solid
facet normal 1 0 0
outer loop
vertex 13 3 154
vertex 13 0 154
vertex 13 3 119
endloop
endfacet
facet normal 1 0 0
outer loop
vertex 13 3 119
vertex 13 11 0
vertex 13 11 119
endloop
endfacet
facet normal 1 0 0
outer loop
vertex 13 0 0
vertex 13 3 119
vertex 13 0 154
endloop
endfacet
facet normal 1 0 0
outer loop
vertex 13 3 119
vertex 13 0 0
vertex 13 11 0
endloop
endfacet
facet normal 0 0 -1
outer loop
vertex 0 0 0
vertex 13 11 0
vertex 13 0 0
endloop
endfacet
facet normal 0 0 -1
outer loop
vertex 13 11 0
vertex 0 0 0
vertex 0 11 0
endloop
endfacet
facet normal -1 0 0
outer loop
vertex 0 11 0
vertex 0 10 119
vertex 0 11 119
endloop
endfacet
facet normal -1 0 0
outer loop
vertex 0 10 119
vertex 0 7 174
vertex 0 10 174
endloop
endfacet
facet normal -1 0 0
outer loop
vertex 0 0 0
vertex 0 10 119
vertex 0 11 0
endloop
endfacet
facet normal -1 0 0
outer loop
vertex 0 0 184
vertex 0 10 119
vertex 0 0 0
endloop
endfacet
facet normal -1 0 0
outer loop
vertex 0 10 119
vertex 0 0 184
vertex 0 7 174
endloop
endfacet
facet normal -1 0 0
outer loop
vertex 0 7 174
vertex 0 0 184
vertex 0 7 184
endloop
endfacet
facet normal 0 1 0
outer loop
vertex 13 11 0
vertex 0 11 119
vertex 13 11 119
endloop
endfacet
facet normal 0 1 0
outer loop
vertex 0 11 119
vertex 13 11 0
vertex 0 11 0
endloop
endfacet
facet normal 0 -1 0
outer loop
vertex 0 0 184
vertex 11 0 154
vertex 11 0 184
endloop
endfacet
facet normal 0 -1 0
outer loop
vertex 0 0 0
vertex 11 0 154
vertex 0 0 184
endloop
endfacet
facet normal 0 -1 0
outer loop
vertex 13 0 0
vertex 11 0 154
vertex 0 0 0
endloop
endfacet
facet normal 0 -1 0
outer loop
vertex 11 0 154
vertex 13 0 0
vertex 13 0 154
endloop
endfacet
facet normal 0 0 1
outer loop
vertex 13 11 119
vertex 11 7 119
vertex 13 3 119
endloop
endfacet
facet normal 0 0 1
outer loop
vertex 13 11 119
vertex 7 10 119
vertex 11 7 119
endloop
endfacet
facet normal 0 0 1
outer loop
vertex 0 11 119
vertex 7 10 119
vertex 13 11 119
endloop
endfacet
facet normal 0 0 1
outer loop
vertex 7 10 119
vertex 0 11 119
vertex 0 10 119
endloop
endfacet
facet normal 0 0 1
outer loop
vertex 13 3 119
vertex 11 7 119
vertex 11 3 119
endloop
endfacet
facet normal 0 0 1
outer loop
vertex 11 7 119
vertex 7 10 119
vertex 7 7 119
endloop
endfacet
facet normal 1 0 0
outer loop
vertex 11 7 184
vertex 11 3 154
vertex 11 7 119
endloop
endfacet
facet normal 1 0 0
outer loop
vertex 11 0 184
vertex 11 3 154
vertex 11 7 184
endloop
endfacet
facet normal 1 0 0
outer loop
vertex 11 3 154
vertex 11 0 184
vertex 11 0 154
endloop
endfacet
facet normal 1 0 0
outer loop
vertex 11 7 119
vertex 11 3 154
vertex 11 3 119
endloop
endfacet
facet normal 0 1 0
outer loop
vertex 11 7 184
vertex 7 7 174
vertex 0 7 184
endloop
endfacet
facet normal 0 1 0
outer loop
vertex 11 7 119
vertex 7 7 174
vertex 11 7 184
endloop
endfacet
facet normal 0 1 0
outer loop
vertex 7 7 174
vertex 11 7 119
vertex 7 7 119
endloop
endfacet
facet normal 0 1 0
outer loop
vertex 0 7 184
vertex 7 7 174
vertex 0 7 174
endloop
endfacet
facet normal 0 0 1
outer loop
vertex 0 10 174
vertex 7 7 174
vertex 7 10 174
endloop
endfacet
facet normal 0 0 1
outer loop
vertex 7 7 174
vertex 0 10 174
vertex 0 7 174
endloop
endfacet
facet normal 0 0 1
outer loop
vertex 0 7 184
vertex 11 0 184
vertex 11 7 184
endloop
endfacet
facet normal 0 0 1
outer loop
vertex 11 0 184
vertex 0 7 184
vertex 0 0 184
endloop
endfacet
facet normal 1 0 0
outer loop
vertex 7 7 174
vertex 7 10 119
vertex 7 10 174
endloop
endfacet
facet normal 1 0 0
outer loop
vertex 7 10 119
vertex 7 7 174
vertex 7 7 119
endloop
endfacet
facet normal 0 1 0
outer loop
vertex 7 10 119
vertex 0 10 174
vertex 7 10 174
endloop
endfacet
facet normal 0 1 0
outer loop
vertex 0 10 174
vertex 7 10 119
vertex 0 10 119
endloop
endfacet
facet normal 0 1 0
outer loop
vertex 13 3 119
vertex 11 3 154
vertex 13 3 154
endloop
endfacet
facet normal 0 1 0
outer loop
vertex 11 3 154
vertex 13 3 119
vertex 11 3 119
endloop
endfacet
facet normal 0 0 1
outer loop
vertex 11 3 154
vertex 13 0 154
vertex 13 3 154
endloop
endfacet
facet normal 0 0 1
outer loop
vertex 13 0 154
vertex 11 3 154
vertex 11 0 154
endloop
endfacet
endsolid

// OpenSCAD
translate([6.5, 5.5, 3.5]) color([0.969306850533619, 0.23531586477578126, 0.13212860983739783]) cube([13, 11, 7], center=true);
translate([6.5, 5.5, 10.5]) color([0.23368957459901674, 0.38460662479298113, 0.6084990843462054]) cube([13, 11, 7], center=true);
translate([6.5, 5.5, 17.5]) color([0.1325407149567407, 0.4984659545183915, 0.9178662904203972]) cube([13, 11, 7], center=true);
translate([6.5, 5.5, 24.5]) color([0.6160167741323543, 0.02601445858505036, 0.596125612844632]) cube([13, 11, 7], center=true);
translate([6.5, 5.5, 31.5]) color([0.48919913512172475, 0.30869925031539414, 0.9586301909392594]) cube([13, 11, 7], center=true);
translate([6.5, 5.5, 38.5]) color([0.5555224541780607, 0.16303723797834868, 0.8790785483620981]) cube([13, 11, 7], center=true);
translate([6.5, 5.5, 45.5]) color([0.8092366229990562, 0.7373715302416316, 0.5460288399006699]) cube([13, 11, 7], center=true);
translate([6.5, 5.5, 52.5]) color([0.7042240787132147, 0.07877233817546292, 0.13744427713979768]) cube([13, 11, 7], center=true);
translate([6.5, 5.5, 59.5]) color([0.40185422229333856, 0.1910666288561843, 0.31642065037316636]) cube([13, 11, 7], center=true);
translate([6.5, 5.5, 66.5]) color([0.2917281417853558, 0.9437754009602987, 0.20866341172373193]) cube([13, 11, 7], center=true);
translate([6.5, 5.5, 73.5]) color([0.3151573145870893, 0.7470721078045024, 0.24960896628473228]) cube([13, 11, 7], center=true);
translate([6.5, 5.5, 80.5]) color([0.8629627260654799, 0.6684326881602258, 0.6597695027130189]) cube([13, 11, 7], center=true);
translate([6.5, 5.5, 87.5]) color([0.22591717735012307, 0.3441717078654829, 0.16233220178561225]) cube([13, 11, 7], center=true);
translate([6.5, 5.5, 94.5]) color([0.01697652307419406, 0.5735931064152219, 0.05818297514553228]) cube([13, 11, 7], center=true);
translate([6.5, 5.5, 101.5]) color([0.6304378073753134, 0.35341956482818127, 0.49110709598533775]) cube([13, 11, 7], center=true);
translate([6.5, 5.5, 108.5]) color([0.06132304686728618, 0.24146702174069912, 0.012441234482642782]) cube([13, 11, 7], center=true);
translate([6.5, 5.5, 115.5]) color([0.9455344576677447, 0.3266678829978785, 0.820956849026723]) cube([13, 11, 7], center=true);
translate([5.5, 3.5, 121.5]) color([0.34492851027915805, 0.6639756368298299, 0.13585073420724958]) cube([11, 7, 5], center=true);
translate([5.5, 3.5, 126.5]) color([0.9219835342207869, 0.44896684911260887, 0.1420549627992148]) cube([11, 7, 5], center=true);
translate([5.5, 3.5, 131.5]) color([0.3119518323014343, 0.6490756968320398, 0.7280642389267371]) cube([11, 7, 5], center=true);
translate([5.5, 3.5, 136.5]) color([0.7852833252199665, 0.40863068686923587, 0.009633238682779877]) cube([11, 7, 5], center=true);
translate([5.5, 3.5, 141.5]) color([0.8909238596539266, 0.533705581213062, 0.8046005274030336]) cube([11, 7, 5], center=true);
translate([5.5, 3.5, 146.5]) color([0.9806276909012095, 0.7049346898693578, 0.7590860206033218]) cube([11, 7, 5], center=true);
translate([5.5, 3.5, 151.5]) color([0.5647284680717275, 0.12259546226958773, 0.9539533584587191]) cube([11, 7, 5], center=true);
translate([5.5, 3.5, 156.5]) color([0.1713156178825357, 0.5005542720722199, 0.621843985236089]) cube([11, 7, 5], center=true);
translate([5.5, 3.5, 161.5]) color([0.6619765424276485, 0.8400519693824264, 0.699601591737329]) cube([11, 7, 5], center=true);
translate([5.5, 3.5, 166.5]) color([0.07964741684534404, 0.23738047361475634, 0.8282556520451495]) cube([11, 7, 5], center=true);
translate([5.5, 3.5, 171.5]) color([0.1762738246231843, 0.9459581227747745, 0.9565644324307663]) cube([11, 7, 5], center=true);
translate([5.5, 3.5, 176.5]) color([0.8963269305888116, 0.7428117304122551, 0.8383436924491765]) cube([11, 7, 5], center=true);
translate([5.5, 3.5, 181.5]) color([0.5614087817692366, 0.7177928021437573, 0.4271772721979724]) cube([11, 7, 5], center=true);
translate([3.5, 8.5, 121.5]) color([0.8646648421725511, 0.10365846470378459, 0.6285317276232824]) cube([7, 3, 5], center=true);
translate([3.5, 8.5, 126.5]) color([0.7101075213407797, 0.6149371087697887, 0.0400488022899097]) cube([7, 3, 5], center=true);
translate([3.5, 8.5, 131.5]) color([0.34025031183581533, 0.7380159626358669, 0.3765176313166855]) cube([7, 3, 5], center=true);
translate([3.5, 8.5, 136.5]) color([0.6257641682954356, 0.8894786539399329, 0.4963449395419606]) cube([7, 3, 5], center=true);
translate([3.5, 8.5, 141.5]) color([0.3583651728386771, 0.6716454412848432, 0.45811681625355094]) cube([7, 3, 5], center=true);
translate([3.5, 8.5, 146.5]) color([0.5074379917667022, 0.16228475224599026, 0.7529781863444399]) cube([7, 3, 5], center=true);
translate([3.5, 8.5, 151.5]) color([0.3376457636791449, 0.8033239356600728, 0.9444207727357242]) cube([7, 3, 5], center=true);
translate([3.5, 8.5, 156.5]) color([0.014783921172948133, 0.5303420268039528, 0.2882277186993394]) cube([7, 3, 5], center=true);
translate([3.5, 8.5, 161.5]) color([0.4689175335863792, 0.03492832759702502, 0.5317931441254861]) cube([7, 3, 5], center=true);
translate([3.5, 8.5, 166.5]) color([0.552095437515129, 0.9340898594770107, 0.03830085289416996]) cube([7, 3, 5], center=true);
translate([3.5, 8.5, 171.5]) color([0.3950652682884612, 0.1200155720396251, 0.34658884626630715]) cube([7, 3, 5], center=true);
translate([12.0, 1.5, 121.5]) color([0.051152415727703016, 0.2730496953424699, 0.9956802504828091]) cube([2, 3, 5], center=true);
translate([12.0, 1.5, 126.5]) color([0.25391998649183944, 0.6803935586065328, 0.7027090324157298]) cube([2, 3, 5], center=true);
translate([12.0, 1.5, 131.5]) color([0.9291230685247301, 0.9949404722907454, 0.7620813713006523]) cube([2, 3, 5], center=true);
translate([12.0, 1.5, 136.5]) color([0.7625973189567923, 0.5162610213479427, 0.3860717563215982]) cube([2, 3, 5], center=true);
translate([12.0, 1.5, 141.5]) color([0.8343975914408754, 0.2506337702942619, 0.11599539642064438]) cube([2, 3, 5], center=true);
translate([12.0, 1.5, 146.5]) color([0.9817240858781537, 0.8047994372884794, 0.9431012043694105]) cube([2, 3, 5], center=true);
translate([12.0, 1.5, 151.5]) color([0.24264659424234813, 0.6738638931519124, 0.5327800265053269]) cube([2, 3, 5], center=true);
